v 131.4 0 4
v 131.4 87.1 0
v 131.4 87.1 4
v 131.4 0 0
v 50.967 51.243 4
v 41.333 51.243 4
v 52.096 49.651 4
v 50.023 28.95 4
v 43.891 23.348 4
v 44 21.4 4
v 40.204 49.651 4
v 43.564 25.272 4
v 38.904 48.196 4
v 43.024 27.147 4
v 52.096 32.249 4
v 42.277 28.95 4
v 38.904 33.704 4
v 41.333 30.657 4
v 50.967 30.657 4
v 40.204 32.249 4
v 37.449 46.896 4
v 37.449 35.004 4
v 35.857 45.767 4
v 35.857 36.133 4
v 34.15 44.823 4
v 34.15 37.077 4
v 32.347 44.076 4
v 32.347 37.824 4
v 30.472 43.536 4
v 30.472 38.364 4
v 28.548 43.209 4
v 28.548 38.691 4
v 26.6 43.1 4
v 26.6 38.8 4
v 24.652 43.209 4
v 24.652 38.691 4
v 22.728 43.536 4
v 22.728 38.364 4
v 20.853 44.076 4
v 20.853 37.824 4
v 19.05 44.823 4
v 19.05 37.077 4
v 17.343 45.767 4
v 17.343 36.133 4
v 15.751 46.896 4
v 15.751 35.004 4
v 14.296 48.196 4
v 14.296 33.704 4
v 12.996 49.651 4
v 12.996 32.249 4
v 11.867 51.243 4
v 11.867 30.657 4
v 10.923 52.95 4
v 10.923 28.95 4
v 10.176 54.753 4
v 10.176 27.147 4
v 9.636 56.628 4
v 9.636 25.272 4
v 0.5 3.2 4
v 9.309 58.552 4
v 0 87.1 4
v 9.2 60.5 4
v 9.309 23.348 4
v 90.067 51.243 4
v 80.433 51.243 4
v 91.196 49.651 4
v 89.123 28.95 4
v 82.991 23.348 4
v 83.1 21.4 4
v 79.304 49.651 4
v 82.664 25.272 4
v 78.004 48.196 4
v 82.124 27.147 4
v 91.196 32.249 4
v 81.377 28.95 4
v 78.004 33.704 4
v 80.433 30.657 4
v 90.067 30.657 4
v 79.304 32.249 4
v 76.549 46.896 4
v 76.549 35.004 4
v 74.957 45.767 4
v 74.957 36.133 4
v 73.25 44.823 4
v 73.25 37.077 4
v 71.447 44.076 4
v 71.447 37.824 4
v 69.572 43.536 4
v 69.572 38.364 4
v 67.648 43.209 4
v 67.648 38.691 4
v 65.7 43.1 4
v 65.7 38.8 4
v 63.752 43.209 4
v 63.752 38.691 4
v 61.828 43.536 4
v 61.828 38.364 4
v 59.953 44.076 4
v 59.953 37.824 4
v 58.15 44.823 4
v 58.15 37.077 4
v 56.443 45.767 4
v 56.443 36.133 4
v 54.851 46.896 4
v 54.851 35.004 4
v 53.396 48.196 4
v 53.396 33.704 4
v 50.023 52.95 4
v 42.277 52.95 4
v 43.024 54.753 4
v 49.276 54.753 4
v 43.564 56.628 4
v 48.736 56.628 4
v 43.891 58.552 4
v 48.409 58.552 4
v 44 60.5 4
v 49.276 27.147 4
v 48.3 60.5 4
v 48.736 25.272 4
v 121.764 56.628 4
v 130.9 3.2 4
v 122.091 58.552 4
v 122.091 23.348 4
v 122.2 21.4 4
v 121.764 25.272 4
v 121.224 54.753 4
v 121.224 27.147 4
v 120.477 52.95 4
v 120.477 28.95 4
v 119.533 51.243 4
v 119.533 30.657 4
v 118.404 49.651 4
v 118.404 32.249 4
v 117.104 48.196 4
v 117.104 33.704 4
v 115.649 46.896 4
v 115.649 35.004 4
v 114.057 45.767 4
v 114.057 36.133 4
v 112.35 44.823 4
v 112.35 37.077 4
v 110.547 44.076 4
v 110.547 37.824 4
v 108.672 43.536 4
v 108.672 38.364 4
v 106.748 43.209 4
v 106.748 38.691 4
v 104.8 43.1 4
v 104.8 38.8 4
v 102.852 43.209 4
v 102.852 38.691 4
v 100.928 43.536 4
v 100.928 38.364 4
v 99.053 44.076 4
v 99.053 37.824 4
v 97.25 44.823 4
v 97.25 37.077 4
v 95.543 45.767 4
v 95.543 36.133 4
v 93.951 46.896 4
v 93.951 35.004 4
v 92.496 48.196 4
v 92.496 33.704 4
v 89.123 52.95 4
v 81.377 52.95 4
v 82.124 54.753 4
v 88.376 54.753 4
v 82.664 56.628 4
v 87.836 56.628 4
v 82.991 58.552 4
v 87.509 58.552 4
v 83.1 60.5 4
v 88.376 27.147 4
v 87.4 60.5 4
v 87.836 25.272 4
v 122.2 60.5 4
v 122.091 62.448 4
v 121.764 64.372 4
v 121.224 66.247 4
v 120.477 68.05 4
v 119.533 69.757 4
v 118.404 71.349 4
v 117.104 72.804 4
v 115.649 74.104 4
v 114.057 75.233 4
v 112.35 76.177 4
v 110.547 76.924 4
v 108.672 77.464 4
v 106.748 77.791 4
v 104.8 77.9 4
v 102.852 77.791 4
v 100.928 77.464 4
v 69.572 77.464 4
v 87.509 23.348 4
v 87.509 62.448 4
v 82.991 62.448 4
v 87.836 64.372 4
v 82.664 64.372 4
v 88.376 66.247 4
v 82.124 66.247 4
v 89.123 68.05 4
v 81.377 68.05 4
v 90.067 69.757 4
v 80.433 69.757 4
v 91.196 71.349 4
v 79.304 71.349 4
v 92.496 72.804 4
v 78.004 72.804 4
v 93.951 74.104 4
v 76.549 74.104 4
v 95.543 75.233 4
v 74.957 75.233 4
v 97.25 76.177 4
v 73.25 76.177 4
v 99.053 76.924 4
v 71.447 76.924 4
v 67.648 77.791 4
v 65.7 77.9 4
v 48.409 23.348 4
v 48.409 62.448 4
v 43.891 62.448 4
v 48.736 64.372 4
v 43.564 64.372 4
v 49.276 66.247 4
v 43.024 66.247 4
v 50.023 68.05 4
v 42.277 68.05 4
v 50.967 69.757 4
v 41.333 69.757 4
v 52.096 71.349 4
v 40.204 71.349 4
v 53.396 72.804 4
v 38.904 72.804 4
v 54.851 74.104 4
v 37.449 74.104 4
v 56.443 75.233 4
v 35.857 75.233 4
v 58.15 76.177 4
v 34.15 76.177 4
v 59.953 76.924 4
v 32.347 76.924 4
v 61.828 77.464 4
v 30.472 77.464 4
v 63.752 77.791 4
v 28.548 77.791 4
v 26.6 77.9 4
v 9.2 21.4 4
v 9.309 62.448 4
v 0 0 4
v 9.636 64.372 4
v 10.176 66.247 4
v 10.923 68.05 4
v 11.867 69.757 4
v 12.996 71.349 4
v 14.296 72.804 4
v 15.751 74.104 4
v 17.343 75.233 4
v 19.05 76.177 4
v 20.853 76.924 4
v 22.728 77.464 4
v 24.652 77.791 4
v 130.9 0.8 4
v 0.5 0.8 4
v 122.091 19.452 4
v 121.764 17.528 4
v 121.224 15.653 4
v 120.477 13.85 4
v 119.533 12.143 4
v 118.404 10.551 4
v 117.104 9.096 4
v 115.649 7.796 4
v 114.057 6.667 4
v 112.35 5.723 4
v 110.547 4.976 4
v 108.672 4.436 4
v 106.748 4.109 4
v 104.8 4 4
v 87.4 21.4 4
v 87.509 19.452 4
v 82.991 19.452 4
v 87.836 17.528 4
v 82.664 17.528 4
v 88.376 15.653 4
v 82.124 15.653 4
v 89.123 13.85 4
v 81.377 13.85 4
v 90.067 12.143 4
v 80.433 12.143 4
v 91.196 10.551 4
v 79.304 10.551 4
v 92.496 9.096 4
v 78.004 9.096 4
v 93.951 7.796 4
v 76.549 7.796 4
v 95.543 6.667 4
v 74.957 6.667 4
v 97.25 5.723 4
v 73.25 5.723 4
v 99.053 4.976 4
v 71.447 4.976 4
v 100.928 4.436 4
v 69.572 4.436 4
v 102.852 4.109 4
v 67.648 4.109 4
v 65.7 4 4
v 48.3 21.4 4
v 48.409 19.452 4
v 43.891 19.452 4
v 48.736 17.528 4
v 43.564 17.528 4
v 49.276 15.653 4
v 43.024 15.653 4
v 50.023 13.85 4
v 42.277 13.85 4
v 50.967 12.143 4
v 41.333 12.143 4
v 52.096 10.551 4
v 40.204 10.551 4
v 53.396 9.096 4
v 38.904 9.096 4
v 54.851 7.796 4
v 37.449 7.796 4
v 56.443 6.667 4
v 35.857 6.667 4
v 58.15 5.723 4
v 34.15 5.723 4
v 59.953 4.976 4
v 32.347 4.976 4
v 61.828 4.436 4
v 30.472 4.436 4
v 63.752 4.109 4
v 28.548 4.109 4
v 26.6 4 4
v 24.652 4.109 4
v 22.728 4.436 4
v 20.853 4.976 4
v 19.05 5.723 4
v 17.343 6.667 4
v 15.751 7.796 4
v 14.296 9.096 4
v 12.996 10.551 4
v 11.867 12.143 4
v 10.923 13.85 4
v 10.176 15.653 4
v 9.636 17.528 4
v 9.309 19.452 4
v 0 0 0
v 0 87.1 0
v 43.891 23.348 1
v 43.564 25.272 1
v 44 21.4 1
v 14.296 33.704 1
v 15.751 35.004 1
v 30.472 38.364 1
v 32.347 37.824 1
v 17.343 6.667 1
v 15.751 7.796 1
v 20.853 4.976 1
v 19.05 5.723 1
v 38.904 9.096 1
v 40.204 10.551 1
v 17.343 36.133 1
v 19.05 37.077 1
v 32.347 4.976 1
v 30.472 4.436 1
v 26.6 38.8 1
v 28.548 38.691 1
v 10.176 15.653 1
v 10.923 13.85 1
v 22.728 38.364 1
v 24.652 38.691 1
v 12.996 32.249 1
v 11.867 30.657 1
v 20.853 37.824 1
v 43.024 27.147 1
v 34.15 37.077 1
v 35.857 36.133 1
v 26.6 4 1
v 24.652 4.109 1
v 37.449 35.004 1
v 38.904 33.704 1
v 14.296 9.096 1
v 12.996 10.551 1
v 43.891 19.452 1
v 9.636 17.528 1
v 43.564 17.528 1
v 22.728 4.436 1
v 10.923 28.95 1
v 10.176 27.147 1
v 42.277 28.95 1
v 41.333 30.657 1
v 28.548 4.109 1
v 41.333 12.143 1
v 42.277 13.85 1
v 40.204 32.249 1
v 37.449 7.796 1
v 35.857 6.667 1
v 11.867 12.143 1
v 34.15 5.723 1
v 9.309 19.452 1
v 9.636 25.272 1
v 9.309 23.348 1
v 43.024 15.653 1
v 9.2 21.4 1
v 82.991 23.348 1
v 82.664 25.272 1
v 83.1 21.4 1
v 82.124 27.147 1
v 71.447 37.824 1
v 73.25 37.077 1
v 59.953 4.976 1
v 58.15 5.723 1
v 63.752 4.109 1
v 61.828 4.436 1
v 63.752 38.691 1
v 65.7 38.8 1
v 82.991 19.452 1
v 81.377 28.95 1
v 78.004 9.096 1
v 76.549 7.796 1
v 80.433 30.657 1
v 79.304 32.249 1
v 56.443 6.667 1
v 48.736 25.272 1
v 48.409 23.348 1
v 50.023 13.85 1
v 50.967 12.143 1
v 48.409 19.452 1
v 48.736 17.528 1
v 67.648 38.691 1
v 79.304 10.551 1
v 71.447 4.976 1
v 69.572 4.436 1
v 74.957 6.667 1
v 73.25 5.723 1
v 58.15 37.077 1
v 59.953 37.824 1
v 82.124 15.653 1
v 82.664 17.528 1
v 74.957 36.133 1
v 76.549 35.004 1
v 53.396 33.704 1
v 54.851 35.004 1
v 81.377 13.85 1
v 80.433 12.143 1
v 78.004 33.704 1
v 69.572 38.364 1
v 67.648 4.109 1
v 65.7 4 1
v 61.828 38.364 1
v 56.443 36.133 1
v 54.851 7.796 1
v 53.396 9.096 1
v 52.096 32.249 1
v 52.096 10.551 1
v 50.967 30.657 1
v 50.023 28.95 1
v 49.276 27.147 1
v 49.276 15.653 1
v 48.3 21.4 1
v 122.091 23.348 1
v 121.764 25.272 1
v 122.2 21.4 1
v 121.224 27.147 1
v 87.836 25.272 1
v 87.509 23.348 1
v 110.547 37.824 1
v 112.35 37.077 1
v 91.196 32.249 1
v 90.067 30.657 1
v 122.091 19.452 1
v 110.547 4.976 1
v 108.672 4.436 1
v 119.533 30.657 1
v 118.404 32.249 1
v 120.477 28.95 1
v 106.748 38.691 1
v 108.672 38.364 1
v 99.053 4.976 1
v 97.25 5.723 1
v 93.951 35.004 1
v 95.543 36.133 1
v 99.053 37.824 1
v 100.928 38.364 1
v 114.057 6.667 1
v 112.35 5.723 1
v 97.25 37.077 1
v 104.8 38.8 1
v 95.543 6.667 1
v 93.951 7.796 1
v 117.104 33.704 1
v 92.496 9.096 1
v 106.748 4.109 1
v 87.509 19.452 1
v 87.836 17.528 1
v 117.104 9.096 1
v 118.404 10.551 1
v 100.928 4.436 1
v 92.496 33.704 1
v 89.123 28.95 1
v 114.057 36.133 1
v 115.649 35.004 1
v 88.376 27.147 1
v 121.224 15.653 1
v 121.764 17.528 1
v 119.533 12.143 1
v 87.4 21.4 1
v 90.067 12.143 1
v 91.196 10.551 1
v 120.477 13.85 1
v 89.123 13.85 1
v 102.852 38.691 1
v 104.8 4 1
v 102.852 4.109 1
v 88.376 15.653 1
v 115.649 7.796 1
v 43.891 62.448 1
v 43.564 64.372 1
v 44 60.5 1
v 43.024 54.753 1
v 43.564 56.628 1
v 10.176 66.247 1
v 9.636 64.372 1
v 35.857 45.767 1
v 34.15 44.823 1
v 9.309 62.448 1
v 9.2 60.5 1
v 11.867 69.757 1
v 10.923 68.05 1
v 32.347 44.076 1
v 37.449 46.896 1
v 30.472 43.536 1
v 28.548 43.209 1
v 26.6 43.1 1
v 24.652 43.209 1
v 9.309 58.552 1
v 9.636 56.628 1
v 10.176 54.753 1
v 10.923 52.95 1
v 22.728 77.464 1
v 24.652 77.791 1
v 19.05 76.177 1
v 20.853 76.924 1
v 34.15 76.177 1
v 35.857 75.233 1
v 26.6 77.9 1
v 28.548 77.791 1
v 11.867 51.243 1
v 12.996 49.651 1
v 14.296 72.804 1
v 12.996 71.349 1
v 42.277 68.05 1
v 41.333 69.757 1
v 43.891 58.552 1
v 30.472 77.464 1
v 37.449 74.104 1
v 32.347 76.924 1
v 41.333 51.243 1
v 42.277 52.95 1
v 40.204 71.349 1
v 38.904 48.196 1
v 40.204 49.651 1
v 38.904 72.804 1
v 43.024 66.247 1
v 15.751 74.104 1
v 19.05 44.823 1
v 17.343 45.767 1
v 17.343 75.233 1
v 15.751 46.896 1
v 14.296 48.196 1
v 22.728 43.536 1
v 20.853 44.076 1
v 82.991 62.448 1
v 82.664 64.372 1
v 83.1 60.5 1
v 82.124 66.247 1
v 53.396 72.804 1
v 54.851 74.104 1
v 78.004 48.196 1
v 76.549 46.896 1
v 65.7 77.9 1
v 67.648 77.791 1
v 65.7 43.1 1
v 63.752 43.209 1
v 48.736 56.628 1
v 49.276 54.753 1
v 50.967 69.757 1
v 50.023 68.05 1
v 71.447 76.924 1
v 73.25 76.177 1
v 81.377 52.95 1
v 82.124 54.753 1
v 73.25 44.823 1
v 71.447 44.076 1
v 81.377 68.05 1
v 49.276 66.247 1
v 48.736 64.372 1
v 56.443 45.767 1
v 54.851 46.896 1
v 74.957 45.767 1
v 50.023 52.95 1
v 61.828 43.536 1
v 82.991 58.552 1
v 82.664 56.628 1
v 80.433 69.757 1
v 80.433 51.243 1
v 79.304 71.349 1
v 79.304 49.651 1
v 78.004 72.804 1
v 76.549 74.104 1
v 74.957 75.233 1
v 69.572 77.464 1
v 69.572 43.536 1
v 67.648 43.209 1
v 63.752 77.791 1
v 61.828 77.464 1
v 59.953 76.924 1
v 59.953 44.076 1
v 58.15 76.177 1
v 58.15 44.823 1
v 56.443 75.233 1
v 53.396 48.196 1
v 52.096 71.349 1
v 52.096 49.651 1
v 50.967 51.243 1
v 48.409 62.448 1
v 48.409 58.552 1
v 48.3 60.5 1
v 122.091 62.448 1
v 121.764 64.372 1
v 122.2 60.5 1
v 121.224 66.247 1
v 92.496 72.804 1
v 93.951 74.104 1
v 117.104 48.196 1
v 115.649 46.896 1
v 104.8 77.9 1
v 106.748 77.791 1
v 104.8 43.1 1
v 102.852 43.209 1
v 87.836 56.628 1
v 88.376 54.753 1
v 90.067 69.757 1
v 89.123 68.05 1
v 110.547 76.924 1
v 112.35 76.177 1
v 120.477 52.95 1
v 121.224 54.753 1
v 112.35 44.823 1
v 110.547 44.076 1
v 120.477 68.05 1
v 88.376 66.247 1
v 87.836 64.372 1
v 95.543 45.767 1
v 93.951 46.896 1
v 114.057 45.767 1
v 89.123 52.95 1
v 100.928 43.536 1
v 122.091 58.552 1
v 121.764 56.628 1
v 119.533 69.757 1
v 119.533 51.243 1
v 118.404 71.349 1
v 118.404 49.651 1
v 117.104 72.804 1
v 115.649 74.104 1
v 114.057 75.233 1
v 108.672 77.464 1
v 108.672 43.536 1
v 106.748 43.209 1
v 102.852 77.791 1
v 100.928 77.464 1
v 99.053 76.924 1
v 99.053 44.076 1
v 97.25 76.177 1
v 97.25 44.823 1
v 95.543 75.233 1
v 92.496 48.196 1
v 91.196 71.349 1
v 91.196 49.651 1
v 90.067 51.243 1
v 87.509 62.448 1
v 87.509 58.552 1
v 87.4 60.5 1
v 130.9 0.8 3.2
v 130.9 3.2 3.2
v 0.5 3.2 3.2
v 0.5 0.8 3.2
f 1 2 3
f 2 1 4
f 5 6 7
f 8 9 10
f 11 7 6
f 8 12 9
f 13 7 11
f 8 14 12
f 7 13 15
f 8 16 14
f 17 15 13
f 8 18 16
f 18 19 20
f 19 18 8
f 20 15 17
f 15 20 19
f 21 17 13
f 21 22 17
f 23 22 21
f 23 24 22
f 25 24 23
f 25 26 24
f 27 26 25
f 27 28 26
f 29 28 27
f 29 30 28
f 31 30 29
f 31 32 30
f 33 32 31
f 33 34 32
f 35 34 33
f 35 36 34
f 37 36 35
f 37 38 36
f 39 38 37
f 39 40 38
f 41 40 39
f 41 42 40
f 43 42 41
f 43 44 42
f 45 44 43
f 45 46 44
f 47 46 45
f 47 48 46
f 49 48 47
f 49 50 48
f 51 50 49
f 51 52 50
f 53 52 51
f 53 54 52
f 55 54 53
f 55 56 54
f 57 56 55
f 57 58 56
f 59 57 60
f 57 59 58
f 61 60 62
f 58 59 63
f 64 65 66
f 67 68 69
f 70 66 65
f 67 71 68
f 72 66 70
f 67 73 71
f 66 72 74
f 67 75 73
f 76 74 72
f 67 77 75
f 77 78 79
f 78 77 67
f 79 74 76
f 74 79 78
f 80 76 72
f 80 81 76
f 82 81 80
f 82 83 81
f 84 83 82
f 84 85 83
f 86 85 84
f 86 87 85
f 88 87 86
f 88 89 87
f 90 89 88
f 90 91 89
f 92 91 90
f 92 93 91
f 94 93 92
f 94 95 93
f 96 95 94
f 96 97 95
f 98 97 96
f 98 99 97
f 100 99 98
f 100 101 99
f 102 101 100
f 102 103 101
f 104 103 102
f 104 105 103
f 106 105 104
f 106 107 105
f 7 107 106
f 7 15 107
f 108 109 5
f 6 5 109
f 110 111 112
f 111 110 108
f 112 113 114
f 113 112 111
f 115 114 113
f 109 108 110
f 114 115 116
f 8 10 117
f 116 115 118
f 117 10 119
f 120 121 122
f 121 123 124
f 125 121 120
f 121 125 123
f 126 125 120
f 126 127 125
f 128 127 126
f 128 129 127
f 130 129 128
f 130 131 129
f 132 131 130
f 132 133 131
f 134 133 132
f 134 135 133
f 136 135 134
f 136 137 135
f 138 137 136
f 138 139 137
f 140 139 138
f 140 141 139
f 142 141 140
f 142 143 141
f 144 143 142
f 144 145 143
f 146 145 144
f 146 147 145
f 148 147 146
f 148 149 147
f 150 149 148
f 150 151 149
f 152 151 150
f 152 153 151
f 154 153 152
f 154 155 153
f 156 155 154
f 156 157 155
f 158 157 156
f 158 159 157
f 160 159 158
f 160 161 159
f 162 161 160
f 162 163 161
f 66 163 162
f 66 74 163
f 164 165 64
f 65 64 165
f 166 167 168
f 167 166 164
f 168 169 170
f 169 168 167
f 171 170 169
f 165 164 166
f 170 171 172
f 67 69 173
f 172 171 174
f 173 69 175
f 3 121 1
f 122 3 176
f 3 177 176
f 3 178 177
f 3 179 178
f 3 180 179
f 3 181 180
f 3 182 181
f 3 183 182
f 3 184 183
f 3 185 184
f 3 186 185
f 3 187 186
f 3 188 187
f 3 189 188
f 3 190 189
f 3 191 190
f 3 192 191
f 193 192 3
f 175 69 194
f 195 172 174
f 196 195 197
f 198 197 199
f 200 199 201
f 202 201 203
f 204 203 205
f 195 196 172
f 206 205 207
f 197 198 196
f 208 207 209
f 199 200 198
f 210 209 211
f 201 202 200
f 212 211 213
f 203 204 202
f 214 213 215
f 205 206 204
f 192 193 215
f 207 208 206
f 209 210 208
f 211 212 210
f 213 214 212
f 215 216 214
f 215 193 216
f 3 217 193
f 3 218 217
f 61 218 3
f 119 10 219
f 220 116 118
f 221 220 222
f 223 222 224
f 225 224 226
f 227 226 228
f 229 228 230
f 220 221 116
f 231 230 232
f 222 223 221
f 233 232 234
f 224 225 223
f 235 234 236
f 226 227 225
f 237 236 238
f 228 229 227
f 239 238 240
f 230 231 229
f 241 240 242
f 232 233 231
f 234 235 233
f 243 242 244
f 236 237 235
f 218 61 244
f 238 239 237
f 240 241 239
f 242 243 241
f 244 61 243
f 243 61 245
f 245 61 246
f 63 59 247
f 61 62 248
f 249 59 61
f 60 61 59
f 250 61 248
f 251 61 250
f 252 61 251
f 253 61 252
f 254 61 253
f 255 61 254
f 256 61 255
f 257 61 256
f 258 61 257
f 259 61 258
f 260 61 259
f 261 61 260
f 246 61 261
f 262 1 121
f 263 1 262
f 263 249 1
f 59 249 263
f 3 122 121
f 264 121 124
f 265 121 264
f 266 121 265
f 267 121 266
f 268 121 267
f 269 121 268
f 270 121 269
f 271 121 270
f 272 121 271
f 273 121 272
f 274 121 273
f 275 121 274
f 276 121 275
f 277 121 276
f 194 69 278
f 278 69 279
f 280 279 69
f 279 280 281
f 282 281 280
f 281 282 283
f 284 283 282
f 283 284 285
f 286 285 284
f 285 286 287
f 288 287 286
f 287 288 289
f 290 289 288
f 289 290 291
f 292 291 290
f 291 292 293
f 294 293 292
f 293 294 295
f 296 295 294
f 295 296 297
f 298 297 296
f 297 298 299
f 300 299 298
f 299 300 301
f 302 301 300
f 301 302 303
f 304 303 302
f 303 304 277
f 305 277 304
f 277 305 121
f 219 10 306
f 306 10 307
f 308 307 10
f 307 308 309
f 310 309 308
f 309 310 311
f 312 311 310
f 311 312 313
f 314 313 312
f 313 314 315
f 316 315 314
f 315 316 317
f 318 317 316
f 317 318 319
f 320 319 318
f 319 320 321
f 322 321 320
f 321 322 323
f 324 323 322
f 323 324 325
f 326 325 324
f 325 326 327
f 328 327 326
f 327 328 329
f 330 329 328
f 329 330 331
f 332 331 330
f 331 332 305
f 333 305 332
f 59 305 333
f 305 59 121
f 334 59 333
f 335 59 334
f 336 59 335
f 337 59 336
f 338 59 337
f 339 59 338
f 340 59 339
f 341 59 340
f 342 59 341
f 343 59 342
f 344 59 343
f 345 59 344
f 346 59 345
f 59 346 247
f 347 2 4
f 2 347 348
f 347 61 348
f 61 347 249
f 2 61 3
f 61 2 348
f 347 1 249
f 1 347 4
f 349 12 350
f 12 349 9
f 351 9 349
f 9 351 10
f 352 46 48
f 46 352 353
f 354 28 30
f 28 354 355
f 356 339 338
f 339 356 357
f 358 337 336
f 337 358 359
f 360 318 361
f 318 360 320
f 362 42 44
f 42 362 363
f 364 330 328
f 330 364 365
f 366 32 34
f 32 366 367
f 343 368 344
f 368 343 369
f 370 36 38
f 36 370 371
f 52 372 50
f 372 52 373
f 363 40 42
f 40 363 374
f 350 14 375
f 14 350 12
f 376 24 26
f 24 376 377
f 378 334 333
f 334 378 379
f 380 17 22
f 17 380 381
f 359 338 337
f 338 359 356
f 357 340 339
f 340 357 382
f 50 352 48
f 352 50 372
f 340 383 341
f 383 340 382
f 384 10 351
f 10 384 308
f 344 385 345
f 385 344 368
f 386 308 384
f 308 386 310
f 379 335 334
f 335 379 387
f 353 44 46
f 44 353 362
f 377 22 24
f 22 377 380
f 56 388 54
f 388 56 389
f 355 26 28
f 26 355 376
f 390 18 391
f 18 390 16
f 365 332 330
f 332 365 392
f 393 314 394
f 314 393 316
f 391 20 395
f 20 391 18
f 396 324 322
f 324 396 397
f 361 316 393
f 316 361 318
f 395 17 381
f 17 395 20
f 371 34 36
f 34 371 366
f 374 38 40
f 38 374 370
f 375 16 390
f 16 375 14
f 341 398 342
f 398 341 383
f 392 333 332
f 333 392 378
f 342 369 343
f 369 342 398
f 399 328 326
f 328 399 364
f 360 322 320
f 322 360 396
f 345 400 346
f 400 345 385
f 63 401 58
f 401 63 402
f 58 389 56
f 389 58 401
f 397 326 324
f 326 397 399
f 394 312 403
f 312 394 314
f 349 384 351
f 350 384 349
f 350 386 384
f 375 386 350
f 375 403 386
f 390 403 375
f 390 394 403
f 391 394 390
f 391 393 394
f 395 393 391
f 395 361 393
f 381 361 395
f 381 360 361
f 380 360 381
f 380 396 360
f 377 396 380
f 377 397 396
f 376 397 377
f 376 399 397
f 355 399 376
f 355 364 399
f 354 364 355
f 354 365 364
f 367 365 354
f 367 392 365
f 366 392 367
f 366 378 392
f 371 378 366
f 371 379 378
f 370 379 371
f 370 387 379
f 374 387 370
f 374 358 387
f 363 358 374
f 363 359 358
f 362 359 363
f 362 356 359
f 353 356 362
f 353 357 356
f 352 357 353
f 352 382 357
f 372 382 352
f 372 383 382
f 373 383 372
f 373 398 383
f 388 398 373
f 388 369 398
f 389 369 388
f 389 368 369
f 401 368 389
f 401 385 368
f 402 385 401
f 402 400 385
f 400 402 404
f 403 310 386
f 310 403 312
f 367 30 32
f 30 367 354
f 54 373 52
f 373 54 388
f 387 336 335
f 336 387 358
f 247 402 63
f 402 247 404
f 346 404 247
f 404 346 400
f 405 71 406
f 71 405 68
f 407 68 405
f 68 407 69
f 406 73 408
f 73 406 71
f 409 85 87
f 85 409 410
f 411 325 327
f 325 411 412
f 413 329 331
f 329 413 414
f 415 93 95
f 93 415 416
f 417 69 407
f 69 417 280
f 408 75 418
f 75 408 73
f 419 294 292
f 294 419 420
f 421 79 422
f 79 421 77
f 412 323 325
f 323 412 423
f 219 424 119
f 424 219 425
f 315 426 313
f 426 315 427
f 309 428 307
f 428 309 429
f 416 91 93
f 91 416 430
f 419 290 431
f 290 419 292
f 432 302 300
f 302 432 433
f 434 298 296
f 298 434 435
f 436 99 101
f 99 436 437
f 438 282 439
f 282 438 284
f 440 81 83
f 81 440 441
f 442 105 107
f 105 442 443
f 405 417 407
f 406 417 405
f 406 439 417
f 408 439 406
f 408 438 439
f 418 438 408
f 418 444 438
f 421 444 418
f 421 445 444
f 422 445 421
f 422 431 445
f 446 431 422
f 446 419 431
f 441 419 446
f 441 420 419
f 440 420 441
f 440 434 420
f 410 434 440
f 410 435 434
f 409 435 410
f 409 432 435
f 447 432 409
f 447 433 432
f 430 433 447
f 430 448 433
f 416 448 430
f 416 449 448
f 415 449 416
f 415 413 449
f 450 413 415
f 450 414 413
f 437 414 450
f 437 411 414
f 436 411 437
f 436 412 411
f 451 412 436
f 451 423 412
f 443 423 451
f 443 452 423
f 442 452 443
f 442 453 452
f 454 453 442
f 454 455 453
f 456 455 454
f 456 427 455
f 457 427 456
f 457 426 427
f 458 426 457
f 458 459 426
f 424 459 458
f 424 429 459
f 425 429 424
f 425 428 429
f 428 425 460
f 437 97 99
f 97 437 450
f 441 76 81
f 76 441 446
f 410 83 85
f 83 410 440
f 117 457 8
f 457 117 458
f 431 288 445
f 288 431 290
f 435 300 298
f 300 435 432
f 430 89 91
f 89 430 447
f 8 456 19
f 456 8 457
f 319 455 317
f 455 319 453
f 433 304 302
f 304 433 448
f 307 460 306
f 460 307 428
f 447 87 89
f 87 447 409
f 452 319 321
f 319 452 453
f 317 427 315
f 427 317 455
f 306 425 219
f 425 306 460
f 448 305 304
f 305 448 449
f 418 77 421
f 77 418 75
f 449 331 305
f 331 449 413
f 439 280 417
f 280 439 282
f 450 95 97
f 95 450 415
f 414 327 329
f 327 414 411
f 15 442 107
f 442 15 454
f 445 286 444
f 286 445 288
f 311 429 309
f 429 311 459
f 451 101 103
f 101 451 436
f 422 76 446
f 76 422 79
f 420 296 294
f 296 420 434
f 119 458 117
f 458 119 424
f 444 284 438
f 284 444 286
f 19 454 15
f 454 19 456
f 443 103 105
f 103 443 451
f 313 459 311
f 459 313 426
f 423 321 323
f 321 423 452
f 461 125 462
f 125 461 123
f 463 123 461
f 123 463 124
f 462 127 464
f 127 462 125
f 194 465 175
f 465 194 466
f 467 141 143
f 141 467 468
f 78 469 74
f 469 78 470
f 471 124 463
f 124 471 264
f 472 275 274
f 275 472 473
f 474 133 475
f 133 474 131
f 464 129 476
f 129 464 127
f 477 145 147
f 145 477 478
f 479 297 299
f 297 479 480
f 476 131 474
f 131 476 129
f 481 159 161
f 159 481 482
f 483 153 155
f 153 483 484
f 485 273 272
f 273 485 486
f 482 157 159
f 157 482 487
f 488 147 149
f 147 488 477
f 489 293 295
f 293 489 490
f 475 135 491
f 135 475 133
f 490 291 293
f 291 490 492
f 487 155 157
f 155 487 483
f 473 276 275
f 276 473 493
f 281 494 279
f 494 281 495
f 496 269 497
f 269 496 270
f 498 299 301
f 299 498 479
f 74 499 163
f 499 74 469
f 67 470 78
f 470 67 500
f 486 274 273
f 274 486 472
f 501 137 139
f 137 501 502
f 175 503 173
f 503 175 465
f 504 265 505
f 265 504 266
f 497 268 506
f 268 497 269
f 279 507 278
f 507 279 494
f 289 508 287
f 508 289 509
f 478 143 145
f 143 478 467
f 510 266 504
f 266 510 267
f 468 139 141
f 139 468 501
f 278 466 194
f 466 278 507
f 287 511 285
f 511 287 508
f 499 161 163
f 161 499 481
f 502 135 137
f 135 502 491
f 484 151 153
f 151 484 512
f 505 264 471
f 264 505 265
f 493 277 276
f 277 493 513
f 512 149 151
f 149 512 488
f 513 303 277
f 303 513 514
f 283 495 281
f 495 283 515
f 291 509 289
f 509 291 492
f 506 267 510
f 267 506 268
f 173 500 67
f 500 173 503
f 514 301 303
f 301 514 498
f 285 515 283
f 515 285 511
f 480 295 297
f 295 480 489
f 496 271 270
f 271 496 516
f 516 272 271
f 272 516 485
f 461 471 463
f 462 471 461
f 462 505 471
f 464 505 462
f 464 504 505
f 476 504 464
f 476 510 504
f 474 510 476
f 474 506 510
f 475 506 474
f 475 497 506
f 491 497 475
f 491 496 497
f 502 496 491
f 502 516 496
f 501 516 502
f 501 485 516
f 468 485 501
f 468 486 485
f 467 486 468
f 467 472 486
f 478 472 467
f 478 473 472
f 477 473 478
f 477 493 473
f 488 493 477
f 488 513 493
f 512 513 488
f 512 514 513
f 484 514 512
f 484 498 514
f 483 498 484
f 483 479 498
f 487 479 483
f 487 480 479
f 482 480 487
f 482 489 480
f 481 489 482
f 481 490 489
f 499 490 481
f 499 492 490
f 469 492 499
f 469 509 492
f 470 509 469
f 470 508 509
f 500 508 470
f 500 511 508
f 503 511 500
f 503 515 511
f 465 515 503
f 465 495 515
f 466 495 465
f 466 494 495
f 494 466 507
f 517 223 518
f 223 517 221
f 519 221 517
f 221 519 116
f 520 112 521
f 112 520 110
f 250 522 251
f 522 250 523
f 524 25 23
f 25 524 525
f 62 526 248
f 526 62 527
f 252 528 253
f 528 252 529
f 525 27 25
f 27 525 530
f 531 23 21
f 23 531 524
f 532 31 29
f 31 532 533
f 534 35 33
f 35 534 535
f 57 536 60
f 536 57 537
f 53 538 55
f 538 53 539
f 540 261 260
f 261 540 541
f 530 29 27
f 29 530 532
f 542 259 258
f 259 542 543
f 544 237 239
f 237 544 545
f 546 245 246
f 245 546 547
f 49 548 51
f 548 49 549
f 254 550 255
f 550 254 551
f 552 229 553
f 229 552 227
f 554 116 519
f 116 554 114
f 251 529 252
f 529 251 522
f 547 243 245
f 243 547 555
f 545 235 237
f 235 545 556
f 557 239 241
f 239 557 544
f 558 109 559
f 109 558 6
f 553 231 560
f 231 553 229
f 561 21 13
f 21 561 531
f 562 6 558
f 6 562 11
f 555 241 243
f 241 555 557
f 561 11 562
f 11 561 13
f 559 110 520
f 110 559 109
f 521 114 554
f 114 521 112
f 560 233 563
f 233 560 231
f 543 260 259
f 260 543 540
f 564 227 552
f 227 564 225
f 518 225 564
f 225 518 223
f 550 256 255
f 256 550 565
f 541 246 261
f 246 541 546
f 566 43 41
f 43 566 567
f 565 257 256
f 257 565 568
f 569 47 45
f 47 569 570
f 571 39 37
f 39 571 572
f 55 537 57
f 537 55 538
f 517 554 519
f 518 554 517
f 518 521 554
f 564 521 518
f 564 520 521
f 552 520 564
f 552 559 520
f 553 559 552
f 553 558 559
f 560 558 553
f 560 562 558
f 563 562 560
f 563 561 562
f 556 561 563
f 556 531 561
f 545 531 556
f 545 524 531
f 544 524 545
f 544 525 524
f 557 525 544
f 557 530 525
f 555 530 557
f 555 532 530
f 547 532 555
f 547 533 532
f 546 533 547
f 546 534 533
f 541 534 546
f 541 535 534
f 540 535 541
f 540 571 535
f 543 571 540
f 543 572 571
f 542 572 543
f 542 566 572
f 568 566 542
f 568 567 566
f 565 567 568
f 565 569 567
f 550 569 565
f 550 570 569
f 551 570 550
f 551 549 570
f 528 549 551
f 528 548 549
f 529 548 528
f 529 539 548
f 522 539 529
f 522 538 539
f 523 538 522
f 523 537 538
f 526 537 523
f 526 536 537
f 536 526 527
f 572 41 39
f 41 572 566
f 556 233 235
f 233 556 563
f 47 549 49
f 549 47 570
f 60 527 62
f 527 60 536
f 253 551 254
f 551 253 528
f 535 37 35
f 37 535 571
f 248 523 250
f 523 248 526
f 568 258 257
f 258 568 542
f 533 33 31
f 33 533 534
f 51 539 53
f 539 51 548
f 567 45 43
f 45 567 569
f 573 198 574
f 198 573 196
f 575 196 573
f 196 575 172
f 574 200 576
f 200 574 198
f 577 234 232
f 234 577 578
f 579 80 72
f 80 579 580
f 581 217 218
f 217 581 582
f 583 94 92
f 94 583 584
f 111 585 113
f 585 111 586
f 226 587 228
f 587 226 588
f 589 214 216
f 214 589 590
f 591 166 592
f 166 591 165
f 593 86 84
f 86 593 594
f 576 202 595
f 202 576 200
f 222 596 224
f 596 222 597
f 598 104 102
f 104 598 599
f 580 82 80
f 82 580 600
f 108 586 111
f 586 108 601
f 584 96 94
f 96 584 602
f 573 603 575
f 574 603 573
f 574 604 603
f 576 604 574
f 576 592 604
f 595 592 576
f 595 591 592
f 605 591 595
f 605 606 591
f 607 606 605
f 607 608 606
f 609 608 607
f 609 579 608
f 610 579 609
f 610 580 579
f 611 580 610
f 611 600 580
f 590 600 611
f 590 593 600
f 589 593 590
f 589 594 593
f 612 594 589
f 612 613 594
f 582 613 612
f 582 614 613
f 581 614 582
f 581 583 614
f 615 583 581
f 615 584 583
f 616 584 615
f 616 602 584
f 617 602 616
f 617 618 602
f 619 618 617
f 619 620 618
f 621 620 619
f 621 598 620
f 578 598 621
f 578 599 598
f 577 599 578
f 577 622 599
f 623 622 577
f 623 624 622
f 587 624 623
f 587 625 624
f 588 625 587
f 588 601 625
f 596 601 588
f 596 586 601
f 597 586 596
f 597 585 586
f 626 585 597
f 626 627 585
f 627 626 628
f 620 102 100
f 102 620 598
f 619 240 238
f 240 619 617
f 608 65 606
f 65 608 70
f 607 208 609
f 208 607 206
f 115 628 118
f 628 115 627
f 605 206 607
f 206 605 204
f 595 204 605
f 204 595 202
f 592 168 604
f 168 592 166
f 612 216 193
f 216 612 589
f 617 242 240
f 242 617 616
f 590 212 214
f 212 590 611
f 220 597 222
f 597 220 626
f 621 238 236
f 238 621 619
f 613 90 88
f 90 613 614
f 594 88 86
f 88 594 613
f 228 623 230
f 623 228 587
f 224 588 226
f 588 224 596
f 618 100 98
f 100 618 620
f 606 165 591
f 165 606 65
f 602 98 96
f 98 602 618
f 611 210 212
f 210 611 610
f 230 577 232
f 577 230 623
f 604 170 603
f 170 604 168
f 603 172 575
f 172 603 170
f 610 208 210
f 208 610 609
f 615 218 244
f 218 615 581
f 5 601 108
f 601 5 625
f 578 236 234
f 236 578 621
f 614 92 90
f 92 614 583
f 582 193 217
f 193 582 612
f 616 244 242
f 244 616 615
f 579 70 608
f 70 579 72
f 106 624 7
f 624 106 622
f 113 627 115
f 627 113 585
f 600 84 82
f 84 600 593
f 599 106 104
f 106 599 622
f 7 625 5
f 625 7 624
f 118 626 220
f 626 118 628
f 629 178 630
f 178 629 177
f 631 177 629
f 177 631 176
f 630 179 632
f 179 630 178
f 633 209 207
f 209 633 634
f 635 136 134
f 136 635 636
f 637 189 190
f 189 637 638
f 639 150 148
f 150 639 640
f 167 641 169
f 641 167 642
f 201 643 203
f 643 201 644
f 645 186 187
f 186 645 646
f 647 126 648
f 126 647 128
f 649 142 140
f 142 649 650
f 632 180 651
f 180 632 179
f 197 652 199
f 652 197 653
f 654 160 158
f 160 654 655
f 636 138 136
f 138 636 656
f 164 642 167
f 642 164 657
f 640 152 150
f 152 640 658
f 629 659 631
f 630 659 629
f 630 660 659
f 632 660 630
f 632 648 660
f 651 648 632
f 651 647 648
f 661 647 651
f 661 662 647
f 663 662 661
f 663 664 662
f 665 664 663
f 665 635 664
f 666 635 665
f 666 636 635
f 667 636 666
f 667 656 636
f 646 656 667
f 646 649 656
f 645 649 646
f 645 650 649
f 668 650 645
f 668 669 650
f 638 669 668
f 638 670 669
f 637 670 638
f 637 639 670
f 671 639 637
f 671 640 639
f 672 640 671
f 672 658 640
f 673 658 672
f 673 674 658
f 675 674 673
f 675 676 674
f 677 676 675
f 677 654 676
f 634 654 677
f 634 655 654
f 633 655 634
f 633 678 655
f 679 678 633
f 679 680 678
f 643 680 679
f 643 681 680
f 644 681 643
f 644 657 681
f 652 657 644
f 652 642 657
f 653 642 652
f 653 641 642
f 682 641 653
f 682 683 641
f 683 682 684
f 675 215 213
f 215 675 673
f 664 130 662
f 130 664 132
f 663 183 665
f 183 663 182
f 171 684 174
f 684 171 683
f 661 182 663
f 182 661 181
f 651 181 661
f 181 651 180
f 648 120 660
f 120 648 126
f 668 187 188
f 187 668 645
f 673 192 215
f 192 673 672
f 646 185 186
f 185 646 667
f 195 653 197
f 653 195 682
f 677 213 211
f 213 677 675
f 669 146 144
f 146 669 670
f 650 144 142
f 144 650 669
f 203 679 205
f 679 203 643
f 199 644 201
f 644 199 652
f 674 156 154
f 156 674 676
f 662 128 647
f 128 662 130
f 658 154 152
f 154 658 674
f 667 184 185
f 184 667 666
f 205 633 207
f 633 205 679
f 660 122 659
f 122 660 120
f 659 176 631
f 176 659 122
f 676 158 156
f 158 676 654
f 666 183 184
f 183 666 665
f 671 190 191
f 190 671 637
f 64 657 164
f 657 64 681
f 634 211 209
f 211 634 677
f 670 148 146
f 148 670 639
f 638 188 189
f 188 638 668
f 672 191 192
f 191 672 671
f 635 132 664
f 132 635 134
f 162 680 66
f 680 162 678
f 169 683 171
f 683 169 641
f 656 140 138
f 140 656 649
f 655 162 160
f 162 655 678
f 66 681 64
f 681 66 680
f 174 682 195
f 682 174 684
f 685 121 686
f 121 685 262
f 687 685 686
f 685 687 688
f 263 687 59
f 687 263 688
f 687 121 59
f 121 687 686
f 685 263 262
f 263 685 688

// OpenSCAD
// GENtle rack OpenSCAD export
// rack_id=cell-culture-6well
// template=cell_culture_plate
// family=cell_culture
// format=cell_culture_plate_well
$fn = 56;

outer_width = 131.400;
outer_depth = 87.100;
rack_height = 4.000;
opening_diameter = 34.800;
floor_thickness = 1.000;
front_top_clearance = 4.000;
front_label_strip_depth = 8.000;
front_label_strip_recess = 0.800;
corner_radius = 2.000;

module gentle_rack() {
    difference() {
        cube([outer_width, outer_depth, rack_height], false);
        translate([26.600, 21.400, floor_thickness]) cylinder(h=rack_height - floor_thickness + 0.10, d=opening_diameter);
        translate([65.700, 21.400, floor_thickness]) cylinder(h=rack_height - floor_thickness + 0.10, d=opening_diameter);
        translate([104.800, 21.400, floor_thickness]) cylinder(h=rack_height - floor_thickness + 0.10, d=opening_diameter);
        translate([26.600, 60.500, floor_thickness]) cylinder(h=rack_height - floor_thickness + 0.10, d=opening_diameter);
        translate([65.700, 60.500, floor_thickness]) cylinder(h=rack_height - floor_thickness + 0.10, d=opening_diameter);
        translate([104.800, 60.500, floor_thickness]) cylinder(h=rack_height - floor_thickness + 0.10, d=opening_diameter);
        translate([0.500, 0.800, rack_height - front_label_strip_recess]) cube([130.400, 2.400, front_label_strip_recess + 0.05], false);
    }
}

gentle_rack();
